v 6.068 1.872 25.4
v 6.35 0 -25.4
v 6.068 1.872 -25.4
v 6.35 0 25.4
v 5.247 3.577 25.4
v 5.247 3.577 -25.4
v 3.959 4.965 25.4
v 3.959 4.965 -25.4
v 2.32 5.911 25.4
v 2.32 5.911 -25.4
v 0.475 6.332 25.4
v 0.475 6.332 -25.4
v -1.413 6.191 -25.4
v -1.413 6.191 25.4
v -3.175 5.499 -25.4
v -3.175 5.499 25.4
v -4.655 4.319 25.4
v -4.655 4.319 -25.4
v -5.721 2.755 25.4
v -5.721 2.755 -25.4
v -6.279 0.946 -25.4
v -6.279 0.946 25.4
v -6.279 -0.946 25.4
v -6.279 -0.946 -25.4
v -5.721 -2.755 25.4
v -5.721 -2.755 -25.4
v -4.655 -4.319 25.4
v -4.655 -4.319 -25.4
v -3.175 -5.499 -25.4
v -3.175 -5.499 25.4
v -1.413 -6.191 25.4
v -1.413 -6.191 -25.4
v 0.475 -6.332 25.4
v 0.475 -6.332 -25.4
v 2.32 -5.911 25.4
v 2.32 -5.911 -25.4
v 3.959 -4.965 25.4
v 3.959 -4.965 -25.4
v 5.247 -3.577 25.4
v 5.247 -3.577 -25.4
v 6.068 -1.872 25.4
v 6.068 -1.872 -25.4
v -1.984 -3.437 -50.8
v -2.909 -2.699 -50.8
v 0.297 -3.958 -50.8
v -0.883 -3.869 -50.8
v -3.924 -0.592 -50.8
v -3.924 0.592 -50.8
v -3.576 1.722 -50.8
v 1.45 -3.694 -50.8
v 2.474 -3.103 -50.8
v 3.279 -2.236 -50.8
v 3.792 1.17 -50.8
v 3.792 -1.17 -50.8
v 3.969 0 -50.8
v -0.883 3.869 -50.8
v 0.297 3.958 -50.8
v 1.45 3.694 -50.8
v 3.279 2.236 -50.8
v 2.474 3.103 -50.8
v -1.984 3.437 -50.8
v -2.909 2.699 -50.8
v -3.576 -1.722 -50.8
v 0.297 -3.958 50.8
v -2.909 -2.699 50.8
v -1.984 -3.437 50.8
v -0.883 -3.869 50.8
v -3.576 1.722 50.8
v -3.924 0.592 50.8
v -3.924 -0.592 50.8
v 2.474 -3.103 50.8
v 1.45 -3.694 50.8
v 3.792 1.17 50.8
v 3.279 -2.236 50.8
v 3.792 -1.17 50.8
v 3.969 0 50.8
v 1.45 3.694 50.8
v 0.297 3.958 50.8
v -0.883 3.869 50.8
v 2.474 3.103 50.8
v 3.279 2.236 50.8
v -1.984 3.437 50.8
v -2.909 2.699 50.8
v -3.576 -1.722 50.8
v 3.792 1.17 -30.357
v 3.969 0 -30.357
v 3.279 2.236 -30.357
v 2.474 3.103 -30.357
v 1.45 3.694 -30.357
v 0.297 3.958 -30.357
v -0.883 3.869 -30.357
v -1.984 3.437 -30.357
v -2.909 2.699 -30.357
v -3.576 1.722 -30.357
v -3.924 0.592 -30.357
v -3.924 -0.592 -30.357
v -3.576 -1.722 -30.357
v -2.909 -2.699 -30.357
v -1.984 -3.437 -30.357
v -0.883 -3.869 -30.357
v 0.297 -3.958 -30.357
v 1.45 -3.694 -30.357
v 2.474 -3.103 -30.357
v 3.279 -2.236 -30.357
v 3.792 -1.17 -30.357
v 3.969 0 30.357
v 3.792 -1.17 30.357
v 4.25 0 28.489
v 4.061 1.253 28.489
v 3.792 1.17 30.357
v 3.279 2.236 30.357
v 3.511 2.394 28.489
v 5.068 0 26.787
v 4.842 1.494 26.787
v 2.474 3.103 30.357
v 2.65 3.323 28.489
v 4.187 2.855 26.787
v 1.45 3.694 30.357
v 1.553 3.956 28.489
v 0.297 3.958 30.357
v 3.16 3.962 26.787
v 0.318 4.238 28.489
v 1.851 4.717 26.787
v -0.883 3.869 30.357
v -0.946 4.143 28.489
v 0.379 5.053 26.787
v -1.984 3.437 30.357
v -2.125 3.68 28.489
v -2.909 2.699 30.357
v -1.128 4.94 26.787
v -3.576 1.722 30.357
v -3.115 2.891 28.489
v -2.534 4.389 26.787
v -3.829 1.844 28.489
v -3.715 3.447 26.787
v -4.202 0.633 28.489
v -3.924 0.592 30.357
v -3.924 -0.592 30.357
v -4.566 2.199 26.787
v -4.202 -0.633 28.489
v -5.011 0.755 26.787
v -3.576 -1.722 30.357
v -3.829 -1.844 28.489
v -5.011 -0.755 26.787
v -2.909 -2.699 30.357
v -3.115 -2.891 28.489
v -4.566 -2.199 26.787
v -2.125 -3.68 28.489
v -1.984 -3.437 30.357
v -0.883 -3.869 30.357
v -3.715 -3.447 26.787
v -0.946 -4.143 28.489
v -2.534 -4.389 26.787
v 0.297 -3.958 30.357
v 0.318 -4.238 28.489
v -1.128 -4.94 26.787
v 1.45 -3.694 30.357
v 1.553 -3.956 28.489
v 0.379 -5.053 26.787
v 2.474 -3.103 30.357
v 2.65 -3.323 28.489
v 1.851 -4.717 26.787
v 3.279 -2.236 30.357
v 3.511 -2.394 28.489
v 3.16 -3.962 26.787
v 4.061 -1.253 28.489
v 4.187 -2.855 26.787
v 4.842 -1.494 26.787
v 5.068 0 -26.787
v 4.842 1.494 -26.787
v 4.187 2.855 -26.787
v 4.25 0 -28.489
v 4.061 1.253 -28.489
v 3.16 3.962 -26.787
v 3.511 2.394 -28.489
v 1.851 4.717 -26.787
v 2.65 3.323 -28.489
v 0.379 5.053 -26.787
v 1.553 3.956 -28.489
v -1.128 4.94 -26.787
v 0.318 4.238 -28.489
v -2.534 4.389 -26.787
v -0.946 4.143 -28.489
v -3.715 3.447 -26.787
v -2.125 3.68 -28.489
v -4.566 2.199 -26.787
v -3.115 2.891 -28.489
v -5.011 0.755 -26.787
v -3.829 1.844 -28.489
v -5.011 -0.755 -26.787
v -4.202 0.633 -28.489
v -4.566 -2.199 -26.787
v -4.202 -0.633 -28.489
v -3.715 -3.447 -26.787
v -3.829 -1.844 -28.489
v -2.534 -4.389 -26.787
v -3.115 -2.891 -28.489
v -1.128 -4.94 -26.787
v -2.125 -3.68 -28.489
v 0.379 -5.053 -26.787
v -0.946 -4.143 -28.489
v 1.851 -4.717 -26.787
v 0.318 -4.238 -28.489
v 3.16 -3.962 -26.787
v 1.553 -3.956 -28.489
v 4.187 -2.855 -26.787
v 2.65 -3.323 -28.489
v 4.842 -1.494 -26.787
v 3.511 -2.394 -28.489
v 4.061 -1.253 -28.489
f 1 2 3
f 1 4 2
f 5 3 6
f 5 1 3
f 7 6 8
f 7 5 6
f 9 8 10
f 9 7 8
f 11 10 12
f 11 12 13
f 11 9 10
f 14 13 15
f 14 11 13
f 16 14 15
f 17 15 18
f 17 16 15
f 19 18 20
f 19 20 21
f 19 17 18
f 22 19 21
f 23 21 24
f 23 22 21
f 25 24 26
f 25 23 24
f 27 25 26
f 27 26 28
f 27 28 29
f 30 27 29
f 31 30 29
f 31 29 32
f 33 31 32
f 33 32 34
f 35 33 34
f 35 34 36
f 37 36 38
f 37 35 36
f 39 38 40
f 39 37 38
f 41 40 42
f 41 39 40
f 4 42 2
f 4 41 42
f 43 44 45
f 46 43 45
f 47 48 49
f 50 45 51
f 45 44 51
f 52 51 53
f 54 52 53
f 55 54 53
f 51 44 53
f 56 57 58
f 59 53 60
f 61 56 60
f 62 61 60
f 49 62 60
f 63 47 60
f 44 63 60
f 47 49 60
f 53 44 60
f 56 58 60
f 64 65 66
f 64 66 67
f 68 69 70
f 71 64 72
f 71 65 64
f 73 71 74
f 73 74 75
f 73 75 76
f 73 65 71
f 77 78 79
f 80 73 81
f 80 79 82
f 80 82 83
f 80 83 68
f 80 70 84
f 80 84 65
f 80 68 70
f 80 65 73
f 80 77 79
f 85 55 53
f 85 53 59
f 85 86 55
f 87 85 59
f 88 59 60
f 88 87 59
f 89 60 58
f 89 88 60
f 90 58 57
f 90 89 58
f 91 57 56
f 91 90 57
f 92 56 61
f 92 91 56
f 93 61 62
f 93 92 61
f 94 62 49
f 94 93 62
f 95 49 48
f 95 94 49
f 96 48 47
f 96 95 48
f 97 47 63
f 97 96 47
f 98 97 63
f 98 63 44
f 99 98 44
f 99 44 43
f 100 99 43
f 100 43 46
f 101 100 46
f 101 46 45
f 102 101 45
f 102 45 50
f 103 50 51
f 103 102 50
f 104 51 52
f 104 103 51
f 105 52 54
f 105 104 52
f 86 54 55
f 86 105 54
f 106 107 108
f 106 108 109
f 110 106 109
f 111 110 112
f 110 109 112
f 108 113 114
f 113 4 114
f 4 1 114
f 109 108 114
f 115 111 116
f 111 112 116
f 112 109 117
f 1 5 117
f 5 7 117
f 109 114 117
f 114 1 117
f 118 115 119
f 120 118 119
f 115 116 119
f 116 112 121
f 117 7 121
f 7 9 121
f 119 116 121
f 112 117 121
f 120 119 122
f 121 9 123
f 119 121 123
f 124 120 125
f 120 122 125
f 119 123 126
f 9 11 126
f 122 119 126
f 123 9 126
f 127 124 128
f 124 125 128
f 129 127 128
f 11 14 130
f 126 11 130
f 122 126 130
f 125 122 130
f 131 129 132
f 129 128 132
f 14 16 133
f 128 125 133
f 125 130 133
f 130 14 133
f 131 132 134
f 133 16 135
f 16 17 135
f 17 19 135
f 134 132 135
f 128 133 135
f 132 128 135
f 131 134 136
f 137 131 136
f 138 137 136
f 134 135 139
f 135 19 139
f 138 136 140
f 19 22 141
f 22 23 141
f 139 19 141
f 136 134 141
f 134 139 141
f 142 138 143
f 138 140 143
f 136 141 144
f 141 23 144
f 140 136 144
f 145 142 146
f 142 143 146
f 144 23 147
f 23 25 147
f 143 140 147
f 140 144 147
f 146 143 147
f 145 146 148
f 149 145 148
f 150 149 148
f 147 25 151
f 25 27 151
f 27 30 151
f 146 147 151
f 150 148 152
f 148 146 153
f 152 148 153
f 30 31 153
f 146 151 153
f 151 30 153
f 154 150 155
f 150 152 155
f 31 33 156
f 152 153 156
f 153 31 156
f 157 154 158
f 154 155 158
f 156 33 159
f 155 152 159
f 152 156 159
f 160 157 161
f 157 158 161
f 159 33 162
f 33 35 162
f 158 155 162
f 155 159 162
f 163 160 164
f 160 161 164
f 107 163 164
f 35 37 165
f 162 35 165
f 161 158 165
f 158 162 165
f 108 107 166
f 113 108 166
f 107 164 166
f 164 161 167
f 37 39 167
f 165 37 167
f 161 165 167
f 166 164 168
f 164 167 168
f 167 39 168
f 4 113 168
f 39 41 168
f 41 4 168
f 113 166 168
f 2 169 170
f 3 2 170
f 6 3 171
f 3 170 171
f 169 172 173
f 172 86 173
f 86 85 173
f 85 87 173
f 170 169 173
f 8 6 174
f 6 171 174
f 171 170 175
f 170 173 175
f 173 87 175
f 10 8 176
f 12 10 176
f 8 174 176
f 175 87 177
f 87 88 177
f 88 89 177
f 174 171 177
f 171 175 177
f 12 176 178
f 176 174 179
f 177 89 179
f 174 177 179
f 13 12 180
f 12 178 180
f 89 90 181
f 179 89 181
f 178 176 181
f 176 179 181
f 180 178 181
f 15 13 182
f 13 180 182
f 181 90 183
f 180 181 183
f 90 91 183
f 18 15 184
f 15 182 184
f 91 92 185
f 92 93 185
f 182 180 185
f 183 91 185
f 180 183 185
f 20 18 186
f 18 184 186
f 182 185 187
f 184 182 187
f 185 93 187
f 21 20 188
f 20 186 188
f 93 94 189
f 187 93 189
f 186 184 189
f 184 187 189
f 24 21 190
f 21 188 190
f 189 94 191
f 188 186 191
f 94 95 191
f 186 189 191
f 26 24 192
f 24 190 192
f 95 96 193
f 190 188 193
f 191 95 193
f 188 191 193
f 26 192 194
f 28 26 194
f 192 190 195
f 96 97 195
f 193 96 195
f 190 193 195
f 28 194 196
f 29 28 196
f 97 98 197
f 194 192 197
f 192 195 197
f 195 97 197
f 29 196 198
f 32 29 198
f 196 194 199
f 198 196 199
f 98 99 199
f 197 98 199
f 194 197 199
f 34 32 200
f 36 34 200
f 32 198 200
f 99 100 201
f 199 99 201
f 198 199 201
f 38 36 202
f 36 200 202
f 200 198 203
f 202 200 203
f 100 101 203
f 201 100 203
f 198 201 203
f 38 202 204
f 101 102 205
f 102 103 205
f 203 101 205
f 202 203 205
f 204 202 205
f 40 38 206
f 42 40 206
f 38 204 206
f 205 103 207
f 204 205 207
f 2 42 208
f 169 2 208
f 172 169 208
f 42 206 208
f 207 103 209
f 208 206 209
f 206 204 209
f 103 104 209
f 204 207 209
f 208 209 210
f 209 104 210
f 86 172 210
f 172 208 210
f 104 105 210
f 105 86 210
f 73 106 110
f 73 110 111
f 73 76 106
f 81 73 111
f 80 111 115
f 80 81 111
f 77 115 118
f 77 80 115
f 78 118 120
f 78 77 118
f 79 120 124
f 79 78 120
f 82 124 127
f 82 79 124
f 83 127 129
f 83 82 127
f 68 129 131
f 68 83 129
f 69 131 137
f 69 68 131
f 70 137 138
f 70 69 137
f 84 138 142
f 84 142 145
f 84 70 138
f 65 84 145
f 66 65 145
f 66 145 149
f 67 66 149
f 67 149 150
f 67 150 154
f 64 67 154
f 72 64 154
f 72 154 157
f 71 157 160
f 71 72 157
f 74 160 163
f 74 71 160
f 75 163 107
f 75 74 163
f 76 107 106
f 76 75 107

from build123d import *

# Parameters (mm, degrees)
SKETCH1_R           = 6.35
BOSS_EXTRUDE1_DEPTH = 25.4
SKETCH2_R           = 3.96875
BOSS_EXTRUDE2_DEPTH = 50.8
FILLET1_R           = 6.35


with BuildPart() as part:
    # Sketch1 → Boss-Extrude1 (new, symmetric)
    with BuildSketch(Plane.XY):
        Circle(SKETCH1_R)
    extrude(amount=BOSS_EXTRUDE1_DEPTH, both=True)

    # Sketch2 → Boss-Extrude2 (add, symmetric)
    with BuildSketch(Plane.XY):
        Circle(SKETCH2_R)
    extrude(amount=BOSS_EXTRUDE2_DEPTH, both=True)

    # Fillet1
    # the kernel refuses this fillet: 6.35 mm, written as the material it adds along each edge
    with BuildSketch(Plane(origin=(0, 0, -25.4), x_dir=(1, 0, 0), z_dir=(0, -1, 0))) as fillet1_piece_1:
        with BuildLine():
            CenterArc((10.31875, -4.956967161), FILLET1_R, 128.682187453, 51.317812547)
            Line((3.96875, -4.956967161), (3.84175, -4.956967161))
            Line((3.84175, -4.956967161), (3.84175, 0))
            Line((3.84175, 0), (3.96875, 0.127))
            ThreePointArc((3.96875, 0.127), (5.159375, 0.127), (6.270625, 0.099139343))
            Line((6.270625, 0.099139343), (6.35, 0))
        make_face()
    revolve(axis=Axis((0, 0, -25.4), (0, 0, 1)))
    with BuildSketch(Plane(origin=(0, 0, 25.4), x_dir=(1, 0, 0), z_dir=(0, -1, 0))) as fillet1_piece_2:
        with BuildLine():
            CenterArc((10.31875, 4.956967161), FILLET1_R, 180, 51.317812547)
            Line((3.96875, 4.956967161), (3.84175, 4.956967161))
            Line((3.84175, 4.956967161), (3.84175, 0))
            Line((3.84175, 0), (3.96875, -0.127))
            ThreePointArc((3.96875, -0.127), (5.159375, -0.127), (6.270625, -0.099139343))
            Line((6.270625, -0.099139343), (6.35, 0))
        make_face()
    revolve(axis=Axis((0, 0, 25.4), (0, 0, 1)))


solid = part.part
